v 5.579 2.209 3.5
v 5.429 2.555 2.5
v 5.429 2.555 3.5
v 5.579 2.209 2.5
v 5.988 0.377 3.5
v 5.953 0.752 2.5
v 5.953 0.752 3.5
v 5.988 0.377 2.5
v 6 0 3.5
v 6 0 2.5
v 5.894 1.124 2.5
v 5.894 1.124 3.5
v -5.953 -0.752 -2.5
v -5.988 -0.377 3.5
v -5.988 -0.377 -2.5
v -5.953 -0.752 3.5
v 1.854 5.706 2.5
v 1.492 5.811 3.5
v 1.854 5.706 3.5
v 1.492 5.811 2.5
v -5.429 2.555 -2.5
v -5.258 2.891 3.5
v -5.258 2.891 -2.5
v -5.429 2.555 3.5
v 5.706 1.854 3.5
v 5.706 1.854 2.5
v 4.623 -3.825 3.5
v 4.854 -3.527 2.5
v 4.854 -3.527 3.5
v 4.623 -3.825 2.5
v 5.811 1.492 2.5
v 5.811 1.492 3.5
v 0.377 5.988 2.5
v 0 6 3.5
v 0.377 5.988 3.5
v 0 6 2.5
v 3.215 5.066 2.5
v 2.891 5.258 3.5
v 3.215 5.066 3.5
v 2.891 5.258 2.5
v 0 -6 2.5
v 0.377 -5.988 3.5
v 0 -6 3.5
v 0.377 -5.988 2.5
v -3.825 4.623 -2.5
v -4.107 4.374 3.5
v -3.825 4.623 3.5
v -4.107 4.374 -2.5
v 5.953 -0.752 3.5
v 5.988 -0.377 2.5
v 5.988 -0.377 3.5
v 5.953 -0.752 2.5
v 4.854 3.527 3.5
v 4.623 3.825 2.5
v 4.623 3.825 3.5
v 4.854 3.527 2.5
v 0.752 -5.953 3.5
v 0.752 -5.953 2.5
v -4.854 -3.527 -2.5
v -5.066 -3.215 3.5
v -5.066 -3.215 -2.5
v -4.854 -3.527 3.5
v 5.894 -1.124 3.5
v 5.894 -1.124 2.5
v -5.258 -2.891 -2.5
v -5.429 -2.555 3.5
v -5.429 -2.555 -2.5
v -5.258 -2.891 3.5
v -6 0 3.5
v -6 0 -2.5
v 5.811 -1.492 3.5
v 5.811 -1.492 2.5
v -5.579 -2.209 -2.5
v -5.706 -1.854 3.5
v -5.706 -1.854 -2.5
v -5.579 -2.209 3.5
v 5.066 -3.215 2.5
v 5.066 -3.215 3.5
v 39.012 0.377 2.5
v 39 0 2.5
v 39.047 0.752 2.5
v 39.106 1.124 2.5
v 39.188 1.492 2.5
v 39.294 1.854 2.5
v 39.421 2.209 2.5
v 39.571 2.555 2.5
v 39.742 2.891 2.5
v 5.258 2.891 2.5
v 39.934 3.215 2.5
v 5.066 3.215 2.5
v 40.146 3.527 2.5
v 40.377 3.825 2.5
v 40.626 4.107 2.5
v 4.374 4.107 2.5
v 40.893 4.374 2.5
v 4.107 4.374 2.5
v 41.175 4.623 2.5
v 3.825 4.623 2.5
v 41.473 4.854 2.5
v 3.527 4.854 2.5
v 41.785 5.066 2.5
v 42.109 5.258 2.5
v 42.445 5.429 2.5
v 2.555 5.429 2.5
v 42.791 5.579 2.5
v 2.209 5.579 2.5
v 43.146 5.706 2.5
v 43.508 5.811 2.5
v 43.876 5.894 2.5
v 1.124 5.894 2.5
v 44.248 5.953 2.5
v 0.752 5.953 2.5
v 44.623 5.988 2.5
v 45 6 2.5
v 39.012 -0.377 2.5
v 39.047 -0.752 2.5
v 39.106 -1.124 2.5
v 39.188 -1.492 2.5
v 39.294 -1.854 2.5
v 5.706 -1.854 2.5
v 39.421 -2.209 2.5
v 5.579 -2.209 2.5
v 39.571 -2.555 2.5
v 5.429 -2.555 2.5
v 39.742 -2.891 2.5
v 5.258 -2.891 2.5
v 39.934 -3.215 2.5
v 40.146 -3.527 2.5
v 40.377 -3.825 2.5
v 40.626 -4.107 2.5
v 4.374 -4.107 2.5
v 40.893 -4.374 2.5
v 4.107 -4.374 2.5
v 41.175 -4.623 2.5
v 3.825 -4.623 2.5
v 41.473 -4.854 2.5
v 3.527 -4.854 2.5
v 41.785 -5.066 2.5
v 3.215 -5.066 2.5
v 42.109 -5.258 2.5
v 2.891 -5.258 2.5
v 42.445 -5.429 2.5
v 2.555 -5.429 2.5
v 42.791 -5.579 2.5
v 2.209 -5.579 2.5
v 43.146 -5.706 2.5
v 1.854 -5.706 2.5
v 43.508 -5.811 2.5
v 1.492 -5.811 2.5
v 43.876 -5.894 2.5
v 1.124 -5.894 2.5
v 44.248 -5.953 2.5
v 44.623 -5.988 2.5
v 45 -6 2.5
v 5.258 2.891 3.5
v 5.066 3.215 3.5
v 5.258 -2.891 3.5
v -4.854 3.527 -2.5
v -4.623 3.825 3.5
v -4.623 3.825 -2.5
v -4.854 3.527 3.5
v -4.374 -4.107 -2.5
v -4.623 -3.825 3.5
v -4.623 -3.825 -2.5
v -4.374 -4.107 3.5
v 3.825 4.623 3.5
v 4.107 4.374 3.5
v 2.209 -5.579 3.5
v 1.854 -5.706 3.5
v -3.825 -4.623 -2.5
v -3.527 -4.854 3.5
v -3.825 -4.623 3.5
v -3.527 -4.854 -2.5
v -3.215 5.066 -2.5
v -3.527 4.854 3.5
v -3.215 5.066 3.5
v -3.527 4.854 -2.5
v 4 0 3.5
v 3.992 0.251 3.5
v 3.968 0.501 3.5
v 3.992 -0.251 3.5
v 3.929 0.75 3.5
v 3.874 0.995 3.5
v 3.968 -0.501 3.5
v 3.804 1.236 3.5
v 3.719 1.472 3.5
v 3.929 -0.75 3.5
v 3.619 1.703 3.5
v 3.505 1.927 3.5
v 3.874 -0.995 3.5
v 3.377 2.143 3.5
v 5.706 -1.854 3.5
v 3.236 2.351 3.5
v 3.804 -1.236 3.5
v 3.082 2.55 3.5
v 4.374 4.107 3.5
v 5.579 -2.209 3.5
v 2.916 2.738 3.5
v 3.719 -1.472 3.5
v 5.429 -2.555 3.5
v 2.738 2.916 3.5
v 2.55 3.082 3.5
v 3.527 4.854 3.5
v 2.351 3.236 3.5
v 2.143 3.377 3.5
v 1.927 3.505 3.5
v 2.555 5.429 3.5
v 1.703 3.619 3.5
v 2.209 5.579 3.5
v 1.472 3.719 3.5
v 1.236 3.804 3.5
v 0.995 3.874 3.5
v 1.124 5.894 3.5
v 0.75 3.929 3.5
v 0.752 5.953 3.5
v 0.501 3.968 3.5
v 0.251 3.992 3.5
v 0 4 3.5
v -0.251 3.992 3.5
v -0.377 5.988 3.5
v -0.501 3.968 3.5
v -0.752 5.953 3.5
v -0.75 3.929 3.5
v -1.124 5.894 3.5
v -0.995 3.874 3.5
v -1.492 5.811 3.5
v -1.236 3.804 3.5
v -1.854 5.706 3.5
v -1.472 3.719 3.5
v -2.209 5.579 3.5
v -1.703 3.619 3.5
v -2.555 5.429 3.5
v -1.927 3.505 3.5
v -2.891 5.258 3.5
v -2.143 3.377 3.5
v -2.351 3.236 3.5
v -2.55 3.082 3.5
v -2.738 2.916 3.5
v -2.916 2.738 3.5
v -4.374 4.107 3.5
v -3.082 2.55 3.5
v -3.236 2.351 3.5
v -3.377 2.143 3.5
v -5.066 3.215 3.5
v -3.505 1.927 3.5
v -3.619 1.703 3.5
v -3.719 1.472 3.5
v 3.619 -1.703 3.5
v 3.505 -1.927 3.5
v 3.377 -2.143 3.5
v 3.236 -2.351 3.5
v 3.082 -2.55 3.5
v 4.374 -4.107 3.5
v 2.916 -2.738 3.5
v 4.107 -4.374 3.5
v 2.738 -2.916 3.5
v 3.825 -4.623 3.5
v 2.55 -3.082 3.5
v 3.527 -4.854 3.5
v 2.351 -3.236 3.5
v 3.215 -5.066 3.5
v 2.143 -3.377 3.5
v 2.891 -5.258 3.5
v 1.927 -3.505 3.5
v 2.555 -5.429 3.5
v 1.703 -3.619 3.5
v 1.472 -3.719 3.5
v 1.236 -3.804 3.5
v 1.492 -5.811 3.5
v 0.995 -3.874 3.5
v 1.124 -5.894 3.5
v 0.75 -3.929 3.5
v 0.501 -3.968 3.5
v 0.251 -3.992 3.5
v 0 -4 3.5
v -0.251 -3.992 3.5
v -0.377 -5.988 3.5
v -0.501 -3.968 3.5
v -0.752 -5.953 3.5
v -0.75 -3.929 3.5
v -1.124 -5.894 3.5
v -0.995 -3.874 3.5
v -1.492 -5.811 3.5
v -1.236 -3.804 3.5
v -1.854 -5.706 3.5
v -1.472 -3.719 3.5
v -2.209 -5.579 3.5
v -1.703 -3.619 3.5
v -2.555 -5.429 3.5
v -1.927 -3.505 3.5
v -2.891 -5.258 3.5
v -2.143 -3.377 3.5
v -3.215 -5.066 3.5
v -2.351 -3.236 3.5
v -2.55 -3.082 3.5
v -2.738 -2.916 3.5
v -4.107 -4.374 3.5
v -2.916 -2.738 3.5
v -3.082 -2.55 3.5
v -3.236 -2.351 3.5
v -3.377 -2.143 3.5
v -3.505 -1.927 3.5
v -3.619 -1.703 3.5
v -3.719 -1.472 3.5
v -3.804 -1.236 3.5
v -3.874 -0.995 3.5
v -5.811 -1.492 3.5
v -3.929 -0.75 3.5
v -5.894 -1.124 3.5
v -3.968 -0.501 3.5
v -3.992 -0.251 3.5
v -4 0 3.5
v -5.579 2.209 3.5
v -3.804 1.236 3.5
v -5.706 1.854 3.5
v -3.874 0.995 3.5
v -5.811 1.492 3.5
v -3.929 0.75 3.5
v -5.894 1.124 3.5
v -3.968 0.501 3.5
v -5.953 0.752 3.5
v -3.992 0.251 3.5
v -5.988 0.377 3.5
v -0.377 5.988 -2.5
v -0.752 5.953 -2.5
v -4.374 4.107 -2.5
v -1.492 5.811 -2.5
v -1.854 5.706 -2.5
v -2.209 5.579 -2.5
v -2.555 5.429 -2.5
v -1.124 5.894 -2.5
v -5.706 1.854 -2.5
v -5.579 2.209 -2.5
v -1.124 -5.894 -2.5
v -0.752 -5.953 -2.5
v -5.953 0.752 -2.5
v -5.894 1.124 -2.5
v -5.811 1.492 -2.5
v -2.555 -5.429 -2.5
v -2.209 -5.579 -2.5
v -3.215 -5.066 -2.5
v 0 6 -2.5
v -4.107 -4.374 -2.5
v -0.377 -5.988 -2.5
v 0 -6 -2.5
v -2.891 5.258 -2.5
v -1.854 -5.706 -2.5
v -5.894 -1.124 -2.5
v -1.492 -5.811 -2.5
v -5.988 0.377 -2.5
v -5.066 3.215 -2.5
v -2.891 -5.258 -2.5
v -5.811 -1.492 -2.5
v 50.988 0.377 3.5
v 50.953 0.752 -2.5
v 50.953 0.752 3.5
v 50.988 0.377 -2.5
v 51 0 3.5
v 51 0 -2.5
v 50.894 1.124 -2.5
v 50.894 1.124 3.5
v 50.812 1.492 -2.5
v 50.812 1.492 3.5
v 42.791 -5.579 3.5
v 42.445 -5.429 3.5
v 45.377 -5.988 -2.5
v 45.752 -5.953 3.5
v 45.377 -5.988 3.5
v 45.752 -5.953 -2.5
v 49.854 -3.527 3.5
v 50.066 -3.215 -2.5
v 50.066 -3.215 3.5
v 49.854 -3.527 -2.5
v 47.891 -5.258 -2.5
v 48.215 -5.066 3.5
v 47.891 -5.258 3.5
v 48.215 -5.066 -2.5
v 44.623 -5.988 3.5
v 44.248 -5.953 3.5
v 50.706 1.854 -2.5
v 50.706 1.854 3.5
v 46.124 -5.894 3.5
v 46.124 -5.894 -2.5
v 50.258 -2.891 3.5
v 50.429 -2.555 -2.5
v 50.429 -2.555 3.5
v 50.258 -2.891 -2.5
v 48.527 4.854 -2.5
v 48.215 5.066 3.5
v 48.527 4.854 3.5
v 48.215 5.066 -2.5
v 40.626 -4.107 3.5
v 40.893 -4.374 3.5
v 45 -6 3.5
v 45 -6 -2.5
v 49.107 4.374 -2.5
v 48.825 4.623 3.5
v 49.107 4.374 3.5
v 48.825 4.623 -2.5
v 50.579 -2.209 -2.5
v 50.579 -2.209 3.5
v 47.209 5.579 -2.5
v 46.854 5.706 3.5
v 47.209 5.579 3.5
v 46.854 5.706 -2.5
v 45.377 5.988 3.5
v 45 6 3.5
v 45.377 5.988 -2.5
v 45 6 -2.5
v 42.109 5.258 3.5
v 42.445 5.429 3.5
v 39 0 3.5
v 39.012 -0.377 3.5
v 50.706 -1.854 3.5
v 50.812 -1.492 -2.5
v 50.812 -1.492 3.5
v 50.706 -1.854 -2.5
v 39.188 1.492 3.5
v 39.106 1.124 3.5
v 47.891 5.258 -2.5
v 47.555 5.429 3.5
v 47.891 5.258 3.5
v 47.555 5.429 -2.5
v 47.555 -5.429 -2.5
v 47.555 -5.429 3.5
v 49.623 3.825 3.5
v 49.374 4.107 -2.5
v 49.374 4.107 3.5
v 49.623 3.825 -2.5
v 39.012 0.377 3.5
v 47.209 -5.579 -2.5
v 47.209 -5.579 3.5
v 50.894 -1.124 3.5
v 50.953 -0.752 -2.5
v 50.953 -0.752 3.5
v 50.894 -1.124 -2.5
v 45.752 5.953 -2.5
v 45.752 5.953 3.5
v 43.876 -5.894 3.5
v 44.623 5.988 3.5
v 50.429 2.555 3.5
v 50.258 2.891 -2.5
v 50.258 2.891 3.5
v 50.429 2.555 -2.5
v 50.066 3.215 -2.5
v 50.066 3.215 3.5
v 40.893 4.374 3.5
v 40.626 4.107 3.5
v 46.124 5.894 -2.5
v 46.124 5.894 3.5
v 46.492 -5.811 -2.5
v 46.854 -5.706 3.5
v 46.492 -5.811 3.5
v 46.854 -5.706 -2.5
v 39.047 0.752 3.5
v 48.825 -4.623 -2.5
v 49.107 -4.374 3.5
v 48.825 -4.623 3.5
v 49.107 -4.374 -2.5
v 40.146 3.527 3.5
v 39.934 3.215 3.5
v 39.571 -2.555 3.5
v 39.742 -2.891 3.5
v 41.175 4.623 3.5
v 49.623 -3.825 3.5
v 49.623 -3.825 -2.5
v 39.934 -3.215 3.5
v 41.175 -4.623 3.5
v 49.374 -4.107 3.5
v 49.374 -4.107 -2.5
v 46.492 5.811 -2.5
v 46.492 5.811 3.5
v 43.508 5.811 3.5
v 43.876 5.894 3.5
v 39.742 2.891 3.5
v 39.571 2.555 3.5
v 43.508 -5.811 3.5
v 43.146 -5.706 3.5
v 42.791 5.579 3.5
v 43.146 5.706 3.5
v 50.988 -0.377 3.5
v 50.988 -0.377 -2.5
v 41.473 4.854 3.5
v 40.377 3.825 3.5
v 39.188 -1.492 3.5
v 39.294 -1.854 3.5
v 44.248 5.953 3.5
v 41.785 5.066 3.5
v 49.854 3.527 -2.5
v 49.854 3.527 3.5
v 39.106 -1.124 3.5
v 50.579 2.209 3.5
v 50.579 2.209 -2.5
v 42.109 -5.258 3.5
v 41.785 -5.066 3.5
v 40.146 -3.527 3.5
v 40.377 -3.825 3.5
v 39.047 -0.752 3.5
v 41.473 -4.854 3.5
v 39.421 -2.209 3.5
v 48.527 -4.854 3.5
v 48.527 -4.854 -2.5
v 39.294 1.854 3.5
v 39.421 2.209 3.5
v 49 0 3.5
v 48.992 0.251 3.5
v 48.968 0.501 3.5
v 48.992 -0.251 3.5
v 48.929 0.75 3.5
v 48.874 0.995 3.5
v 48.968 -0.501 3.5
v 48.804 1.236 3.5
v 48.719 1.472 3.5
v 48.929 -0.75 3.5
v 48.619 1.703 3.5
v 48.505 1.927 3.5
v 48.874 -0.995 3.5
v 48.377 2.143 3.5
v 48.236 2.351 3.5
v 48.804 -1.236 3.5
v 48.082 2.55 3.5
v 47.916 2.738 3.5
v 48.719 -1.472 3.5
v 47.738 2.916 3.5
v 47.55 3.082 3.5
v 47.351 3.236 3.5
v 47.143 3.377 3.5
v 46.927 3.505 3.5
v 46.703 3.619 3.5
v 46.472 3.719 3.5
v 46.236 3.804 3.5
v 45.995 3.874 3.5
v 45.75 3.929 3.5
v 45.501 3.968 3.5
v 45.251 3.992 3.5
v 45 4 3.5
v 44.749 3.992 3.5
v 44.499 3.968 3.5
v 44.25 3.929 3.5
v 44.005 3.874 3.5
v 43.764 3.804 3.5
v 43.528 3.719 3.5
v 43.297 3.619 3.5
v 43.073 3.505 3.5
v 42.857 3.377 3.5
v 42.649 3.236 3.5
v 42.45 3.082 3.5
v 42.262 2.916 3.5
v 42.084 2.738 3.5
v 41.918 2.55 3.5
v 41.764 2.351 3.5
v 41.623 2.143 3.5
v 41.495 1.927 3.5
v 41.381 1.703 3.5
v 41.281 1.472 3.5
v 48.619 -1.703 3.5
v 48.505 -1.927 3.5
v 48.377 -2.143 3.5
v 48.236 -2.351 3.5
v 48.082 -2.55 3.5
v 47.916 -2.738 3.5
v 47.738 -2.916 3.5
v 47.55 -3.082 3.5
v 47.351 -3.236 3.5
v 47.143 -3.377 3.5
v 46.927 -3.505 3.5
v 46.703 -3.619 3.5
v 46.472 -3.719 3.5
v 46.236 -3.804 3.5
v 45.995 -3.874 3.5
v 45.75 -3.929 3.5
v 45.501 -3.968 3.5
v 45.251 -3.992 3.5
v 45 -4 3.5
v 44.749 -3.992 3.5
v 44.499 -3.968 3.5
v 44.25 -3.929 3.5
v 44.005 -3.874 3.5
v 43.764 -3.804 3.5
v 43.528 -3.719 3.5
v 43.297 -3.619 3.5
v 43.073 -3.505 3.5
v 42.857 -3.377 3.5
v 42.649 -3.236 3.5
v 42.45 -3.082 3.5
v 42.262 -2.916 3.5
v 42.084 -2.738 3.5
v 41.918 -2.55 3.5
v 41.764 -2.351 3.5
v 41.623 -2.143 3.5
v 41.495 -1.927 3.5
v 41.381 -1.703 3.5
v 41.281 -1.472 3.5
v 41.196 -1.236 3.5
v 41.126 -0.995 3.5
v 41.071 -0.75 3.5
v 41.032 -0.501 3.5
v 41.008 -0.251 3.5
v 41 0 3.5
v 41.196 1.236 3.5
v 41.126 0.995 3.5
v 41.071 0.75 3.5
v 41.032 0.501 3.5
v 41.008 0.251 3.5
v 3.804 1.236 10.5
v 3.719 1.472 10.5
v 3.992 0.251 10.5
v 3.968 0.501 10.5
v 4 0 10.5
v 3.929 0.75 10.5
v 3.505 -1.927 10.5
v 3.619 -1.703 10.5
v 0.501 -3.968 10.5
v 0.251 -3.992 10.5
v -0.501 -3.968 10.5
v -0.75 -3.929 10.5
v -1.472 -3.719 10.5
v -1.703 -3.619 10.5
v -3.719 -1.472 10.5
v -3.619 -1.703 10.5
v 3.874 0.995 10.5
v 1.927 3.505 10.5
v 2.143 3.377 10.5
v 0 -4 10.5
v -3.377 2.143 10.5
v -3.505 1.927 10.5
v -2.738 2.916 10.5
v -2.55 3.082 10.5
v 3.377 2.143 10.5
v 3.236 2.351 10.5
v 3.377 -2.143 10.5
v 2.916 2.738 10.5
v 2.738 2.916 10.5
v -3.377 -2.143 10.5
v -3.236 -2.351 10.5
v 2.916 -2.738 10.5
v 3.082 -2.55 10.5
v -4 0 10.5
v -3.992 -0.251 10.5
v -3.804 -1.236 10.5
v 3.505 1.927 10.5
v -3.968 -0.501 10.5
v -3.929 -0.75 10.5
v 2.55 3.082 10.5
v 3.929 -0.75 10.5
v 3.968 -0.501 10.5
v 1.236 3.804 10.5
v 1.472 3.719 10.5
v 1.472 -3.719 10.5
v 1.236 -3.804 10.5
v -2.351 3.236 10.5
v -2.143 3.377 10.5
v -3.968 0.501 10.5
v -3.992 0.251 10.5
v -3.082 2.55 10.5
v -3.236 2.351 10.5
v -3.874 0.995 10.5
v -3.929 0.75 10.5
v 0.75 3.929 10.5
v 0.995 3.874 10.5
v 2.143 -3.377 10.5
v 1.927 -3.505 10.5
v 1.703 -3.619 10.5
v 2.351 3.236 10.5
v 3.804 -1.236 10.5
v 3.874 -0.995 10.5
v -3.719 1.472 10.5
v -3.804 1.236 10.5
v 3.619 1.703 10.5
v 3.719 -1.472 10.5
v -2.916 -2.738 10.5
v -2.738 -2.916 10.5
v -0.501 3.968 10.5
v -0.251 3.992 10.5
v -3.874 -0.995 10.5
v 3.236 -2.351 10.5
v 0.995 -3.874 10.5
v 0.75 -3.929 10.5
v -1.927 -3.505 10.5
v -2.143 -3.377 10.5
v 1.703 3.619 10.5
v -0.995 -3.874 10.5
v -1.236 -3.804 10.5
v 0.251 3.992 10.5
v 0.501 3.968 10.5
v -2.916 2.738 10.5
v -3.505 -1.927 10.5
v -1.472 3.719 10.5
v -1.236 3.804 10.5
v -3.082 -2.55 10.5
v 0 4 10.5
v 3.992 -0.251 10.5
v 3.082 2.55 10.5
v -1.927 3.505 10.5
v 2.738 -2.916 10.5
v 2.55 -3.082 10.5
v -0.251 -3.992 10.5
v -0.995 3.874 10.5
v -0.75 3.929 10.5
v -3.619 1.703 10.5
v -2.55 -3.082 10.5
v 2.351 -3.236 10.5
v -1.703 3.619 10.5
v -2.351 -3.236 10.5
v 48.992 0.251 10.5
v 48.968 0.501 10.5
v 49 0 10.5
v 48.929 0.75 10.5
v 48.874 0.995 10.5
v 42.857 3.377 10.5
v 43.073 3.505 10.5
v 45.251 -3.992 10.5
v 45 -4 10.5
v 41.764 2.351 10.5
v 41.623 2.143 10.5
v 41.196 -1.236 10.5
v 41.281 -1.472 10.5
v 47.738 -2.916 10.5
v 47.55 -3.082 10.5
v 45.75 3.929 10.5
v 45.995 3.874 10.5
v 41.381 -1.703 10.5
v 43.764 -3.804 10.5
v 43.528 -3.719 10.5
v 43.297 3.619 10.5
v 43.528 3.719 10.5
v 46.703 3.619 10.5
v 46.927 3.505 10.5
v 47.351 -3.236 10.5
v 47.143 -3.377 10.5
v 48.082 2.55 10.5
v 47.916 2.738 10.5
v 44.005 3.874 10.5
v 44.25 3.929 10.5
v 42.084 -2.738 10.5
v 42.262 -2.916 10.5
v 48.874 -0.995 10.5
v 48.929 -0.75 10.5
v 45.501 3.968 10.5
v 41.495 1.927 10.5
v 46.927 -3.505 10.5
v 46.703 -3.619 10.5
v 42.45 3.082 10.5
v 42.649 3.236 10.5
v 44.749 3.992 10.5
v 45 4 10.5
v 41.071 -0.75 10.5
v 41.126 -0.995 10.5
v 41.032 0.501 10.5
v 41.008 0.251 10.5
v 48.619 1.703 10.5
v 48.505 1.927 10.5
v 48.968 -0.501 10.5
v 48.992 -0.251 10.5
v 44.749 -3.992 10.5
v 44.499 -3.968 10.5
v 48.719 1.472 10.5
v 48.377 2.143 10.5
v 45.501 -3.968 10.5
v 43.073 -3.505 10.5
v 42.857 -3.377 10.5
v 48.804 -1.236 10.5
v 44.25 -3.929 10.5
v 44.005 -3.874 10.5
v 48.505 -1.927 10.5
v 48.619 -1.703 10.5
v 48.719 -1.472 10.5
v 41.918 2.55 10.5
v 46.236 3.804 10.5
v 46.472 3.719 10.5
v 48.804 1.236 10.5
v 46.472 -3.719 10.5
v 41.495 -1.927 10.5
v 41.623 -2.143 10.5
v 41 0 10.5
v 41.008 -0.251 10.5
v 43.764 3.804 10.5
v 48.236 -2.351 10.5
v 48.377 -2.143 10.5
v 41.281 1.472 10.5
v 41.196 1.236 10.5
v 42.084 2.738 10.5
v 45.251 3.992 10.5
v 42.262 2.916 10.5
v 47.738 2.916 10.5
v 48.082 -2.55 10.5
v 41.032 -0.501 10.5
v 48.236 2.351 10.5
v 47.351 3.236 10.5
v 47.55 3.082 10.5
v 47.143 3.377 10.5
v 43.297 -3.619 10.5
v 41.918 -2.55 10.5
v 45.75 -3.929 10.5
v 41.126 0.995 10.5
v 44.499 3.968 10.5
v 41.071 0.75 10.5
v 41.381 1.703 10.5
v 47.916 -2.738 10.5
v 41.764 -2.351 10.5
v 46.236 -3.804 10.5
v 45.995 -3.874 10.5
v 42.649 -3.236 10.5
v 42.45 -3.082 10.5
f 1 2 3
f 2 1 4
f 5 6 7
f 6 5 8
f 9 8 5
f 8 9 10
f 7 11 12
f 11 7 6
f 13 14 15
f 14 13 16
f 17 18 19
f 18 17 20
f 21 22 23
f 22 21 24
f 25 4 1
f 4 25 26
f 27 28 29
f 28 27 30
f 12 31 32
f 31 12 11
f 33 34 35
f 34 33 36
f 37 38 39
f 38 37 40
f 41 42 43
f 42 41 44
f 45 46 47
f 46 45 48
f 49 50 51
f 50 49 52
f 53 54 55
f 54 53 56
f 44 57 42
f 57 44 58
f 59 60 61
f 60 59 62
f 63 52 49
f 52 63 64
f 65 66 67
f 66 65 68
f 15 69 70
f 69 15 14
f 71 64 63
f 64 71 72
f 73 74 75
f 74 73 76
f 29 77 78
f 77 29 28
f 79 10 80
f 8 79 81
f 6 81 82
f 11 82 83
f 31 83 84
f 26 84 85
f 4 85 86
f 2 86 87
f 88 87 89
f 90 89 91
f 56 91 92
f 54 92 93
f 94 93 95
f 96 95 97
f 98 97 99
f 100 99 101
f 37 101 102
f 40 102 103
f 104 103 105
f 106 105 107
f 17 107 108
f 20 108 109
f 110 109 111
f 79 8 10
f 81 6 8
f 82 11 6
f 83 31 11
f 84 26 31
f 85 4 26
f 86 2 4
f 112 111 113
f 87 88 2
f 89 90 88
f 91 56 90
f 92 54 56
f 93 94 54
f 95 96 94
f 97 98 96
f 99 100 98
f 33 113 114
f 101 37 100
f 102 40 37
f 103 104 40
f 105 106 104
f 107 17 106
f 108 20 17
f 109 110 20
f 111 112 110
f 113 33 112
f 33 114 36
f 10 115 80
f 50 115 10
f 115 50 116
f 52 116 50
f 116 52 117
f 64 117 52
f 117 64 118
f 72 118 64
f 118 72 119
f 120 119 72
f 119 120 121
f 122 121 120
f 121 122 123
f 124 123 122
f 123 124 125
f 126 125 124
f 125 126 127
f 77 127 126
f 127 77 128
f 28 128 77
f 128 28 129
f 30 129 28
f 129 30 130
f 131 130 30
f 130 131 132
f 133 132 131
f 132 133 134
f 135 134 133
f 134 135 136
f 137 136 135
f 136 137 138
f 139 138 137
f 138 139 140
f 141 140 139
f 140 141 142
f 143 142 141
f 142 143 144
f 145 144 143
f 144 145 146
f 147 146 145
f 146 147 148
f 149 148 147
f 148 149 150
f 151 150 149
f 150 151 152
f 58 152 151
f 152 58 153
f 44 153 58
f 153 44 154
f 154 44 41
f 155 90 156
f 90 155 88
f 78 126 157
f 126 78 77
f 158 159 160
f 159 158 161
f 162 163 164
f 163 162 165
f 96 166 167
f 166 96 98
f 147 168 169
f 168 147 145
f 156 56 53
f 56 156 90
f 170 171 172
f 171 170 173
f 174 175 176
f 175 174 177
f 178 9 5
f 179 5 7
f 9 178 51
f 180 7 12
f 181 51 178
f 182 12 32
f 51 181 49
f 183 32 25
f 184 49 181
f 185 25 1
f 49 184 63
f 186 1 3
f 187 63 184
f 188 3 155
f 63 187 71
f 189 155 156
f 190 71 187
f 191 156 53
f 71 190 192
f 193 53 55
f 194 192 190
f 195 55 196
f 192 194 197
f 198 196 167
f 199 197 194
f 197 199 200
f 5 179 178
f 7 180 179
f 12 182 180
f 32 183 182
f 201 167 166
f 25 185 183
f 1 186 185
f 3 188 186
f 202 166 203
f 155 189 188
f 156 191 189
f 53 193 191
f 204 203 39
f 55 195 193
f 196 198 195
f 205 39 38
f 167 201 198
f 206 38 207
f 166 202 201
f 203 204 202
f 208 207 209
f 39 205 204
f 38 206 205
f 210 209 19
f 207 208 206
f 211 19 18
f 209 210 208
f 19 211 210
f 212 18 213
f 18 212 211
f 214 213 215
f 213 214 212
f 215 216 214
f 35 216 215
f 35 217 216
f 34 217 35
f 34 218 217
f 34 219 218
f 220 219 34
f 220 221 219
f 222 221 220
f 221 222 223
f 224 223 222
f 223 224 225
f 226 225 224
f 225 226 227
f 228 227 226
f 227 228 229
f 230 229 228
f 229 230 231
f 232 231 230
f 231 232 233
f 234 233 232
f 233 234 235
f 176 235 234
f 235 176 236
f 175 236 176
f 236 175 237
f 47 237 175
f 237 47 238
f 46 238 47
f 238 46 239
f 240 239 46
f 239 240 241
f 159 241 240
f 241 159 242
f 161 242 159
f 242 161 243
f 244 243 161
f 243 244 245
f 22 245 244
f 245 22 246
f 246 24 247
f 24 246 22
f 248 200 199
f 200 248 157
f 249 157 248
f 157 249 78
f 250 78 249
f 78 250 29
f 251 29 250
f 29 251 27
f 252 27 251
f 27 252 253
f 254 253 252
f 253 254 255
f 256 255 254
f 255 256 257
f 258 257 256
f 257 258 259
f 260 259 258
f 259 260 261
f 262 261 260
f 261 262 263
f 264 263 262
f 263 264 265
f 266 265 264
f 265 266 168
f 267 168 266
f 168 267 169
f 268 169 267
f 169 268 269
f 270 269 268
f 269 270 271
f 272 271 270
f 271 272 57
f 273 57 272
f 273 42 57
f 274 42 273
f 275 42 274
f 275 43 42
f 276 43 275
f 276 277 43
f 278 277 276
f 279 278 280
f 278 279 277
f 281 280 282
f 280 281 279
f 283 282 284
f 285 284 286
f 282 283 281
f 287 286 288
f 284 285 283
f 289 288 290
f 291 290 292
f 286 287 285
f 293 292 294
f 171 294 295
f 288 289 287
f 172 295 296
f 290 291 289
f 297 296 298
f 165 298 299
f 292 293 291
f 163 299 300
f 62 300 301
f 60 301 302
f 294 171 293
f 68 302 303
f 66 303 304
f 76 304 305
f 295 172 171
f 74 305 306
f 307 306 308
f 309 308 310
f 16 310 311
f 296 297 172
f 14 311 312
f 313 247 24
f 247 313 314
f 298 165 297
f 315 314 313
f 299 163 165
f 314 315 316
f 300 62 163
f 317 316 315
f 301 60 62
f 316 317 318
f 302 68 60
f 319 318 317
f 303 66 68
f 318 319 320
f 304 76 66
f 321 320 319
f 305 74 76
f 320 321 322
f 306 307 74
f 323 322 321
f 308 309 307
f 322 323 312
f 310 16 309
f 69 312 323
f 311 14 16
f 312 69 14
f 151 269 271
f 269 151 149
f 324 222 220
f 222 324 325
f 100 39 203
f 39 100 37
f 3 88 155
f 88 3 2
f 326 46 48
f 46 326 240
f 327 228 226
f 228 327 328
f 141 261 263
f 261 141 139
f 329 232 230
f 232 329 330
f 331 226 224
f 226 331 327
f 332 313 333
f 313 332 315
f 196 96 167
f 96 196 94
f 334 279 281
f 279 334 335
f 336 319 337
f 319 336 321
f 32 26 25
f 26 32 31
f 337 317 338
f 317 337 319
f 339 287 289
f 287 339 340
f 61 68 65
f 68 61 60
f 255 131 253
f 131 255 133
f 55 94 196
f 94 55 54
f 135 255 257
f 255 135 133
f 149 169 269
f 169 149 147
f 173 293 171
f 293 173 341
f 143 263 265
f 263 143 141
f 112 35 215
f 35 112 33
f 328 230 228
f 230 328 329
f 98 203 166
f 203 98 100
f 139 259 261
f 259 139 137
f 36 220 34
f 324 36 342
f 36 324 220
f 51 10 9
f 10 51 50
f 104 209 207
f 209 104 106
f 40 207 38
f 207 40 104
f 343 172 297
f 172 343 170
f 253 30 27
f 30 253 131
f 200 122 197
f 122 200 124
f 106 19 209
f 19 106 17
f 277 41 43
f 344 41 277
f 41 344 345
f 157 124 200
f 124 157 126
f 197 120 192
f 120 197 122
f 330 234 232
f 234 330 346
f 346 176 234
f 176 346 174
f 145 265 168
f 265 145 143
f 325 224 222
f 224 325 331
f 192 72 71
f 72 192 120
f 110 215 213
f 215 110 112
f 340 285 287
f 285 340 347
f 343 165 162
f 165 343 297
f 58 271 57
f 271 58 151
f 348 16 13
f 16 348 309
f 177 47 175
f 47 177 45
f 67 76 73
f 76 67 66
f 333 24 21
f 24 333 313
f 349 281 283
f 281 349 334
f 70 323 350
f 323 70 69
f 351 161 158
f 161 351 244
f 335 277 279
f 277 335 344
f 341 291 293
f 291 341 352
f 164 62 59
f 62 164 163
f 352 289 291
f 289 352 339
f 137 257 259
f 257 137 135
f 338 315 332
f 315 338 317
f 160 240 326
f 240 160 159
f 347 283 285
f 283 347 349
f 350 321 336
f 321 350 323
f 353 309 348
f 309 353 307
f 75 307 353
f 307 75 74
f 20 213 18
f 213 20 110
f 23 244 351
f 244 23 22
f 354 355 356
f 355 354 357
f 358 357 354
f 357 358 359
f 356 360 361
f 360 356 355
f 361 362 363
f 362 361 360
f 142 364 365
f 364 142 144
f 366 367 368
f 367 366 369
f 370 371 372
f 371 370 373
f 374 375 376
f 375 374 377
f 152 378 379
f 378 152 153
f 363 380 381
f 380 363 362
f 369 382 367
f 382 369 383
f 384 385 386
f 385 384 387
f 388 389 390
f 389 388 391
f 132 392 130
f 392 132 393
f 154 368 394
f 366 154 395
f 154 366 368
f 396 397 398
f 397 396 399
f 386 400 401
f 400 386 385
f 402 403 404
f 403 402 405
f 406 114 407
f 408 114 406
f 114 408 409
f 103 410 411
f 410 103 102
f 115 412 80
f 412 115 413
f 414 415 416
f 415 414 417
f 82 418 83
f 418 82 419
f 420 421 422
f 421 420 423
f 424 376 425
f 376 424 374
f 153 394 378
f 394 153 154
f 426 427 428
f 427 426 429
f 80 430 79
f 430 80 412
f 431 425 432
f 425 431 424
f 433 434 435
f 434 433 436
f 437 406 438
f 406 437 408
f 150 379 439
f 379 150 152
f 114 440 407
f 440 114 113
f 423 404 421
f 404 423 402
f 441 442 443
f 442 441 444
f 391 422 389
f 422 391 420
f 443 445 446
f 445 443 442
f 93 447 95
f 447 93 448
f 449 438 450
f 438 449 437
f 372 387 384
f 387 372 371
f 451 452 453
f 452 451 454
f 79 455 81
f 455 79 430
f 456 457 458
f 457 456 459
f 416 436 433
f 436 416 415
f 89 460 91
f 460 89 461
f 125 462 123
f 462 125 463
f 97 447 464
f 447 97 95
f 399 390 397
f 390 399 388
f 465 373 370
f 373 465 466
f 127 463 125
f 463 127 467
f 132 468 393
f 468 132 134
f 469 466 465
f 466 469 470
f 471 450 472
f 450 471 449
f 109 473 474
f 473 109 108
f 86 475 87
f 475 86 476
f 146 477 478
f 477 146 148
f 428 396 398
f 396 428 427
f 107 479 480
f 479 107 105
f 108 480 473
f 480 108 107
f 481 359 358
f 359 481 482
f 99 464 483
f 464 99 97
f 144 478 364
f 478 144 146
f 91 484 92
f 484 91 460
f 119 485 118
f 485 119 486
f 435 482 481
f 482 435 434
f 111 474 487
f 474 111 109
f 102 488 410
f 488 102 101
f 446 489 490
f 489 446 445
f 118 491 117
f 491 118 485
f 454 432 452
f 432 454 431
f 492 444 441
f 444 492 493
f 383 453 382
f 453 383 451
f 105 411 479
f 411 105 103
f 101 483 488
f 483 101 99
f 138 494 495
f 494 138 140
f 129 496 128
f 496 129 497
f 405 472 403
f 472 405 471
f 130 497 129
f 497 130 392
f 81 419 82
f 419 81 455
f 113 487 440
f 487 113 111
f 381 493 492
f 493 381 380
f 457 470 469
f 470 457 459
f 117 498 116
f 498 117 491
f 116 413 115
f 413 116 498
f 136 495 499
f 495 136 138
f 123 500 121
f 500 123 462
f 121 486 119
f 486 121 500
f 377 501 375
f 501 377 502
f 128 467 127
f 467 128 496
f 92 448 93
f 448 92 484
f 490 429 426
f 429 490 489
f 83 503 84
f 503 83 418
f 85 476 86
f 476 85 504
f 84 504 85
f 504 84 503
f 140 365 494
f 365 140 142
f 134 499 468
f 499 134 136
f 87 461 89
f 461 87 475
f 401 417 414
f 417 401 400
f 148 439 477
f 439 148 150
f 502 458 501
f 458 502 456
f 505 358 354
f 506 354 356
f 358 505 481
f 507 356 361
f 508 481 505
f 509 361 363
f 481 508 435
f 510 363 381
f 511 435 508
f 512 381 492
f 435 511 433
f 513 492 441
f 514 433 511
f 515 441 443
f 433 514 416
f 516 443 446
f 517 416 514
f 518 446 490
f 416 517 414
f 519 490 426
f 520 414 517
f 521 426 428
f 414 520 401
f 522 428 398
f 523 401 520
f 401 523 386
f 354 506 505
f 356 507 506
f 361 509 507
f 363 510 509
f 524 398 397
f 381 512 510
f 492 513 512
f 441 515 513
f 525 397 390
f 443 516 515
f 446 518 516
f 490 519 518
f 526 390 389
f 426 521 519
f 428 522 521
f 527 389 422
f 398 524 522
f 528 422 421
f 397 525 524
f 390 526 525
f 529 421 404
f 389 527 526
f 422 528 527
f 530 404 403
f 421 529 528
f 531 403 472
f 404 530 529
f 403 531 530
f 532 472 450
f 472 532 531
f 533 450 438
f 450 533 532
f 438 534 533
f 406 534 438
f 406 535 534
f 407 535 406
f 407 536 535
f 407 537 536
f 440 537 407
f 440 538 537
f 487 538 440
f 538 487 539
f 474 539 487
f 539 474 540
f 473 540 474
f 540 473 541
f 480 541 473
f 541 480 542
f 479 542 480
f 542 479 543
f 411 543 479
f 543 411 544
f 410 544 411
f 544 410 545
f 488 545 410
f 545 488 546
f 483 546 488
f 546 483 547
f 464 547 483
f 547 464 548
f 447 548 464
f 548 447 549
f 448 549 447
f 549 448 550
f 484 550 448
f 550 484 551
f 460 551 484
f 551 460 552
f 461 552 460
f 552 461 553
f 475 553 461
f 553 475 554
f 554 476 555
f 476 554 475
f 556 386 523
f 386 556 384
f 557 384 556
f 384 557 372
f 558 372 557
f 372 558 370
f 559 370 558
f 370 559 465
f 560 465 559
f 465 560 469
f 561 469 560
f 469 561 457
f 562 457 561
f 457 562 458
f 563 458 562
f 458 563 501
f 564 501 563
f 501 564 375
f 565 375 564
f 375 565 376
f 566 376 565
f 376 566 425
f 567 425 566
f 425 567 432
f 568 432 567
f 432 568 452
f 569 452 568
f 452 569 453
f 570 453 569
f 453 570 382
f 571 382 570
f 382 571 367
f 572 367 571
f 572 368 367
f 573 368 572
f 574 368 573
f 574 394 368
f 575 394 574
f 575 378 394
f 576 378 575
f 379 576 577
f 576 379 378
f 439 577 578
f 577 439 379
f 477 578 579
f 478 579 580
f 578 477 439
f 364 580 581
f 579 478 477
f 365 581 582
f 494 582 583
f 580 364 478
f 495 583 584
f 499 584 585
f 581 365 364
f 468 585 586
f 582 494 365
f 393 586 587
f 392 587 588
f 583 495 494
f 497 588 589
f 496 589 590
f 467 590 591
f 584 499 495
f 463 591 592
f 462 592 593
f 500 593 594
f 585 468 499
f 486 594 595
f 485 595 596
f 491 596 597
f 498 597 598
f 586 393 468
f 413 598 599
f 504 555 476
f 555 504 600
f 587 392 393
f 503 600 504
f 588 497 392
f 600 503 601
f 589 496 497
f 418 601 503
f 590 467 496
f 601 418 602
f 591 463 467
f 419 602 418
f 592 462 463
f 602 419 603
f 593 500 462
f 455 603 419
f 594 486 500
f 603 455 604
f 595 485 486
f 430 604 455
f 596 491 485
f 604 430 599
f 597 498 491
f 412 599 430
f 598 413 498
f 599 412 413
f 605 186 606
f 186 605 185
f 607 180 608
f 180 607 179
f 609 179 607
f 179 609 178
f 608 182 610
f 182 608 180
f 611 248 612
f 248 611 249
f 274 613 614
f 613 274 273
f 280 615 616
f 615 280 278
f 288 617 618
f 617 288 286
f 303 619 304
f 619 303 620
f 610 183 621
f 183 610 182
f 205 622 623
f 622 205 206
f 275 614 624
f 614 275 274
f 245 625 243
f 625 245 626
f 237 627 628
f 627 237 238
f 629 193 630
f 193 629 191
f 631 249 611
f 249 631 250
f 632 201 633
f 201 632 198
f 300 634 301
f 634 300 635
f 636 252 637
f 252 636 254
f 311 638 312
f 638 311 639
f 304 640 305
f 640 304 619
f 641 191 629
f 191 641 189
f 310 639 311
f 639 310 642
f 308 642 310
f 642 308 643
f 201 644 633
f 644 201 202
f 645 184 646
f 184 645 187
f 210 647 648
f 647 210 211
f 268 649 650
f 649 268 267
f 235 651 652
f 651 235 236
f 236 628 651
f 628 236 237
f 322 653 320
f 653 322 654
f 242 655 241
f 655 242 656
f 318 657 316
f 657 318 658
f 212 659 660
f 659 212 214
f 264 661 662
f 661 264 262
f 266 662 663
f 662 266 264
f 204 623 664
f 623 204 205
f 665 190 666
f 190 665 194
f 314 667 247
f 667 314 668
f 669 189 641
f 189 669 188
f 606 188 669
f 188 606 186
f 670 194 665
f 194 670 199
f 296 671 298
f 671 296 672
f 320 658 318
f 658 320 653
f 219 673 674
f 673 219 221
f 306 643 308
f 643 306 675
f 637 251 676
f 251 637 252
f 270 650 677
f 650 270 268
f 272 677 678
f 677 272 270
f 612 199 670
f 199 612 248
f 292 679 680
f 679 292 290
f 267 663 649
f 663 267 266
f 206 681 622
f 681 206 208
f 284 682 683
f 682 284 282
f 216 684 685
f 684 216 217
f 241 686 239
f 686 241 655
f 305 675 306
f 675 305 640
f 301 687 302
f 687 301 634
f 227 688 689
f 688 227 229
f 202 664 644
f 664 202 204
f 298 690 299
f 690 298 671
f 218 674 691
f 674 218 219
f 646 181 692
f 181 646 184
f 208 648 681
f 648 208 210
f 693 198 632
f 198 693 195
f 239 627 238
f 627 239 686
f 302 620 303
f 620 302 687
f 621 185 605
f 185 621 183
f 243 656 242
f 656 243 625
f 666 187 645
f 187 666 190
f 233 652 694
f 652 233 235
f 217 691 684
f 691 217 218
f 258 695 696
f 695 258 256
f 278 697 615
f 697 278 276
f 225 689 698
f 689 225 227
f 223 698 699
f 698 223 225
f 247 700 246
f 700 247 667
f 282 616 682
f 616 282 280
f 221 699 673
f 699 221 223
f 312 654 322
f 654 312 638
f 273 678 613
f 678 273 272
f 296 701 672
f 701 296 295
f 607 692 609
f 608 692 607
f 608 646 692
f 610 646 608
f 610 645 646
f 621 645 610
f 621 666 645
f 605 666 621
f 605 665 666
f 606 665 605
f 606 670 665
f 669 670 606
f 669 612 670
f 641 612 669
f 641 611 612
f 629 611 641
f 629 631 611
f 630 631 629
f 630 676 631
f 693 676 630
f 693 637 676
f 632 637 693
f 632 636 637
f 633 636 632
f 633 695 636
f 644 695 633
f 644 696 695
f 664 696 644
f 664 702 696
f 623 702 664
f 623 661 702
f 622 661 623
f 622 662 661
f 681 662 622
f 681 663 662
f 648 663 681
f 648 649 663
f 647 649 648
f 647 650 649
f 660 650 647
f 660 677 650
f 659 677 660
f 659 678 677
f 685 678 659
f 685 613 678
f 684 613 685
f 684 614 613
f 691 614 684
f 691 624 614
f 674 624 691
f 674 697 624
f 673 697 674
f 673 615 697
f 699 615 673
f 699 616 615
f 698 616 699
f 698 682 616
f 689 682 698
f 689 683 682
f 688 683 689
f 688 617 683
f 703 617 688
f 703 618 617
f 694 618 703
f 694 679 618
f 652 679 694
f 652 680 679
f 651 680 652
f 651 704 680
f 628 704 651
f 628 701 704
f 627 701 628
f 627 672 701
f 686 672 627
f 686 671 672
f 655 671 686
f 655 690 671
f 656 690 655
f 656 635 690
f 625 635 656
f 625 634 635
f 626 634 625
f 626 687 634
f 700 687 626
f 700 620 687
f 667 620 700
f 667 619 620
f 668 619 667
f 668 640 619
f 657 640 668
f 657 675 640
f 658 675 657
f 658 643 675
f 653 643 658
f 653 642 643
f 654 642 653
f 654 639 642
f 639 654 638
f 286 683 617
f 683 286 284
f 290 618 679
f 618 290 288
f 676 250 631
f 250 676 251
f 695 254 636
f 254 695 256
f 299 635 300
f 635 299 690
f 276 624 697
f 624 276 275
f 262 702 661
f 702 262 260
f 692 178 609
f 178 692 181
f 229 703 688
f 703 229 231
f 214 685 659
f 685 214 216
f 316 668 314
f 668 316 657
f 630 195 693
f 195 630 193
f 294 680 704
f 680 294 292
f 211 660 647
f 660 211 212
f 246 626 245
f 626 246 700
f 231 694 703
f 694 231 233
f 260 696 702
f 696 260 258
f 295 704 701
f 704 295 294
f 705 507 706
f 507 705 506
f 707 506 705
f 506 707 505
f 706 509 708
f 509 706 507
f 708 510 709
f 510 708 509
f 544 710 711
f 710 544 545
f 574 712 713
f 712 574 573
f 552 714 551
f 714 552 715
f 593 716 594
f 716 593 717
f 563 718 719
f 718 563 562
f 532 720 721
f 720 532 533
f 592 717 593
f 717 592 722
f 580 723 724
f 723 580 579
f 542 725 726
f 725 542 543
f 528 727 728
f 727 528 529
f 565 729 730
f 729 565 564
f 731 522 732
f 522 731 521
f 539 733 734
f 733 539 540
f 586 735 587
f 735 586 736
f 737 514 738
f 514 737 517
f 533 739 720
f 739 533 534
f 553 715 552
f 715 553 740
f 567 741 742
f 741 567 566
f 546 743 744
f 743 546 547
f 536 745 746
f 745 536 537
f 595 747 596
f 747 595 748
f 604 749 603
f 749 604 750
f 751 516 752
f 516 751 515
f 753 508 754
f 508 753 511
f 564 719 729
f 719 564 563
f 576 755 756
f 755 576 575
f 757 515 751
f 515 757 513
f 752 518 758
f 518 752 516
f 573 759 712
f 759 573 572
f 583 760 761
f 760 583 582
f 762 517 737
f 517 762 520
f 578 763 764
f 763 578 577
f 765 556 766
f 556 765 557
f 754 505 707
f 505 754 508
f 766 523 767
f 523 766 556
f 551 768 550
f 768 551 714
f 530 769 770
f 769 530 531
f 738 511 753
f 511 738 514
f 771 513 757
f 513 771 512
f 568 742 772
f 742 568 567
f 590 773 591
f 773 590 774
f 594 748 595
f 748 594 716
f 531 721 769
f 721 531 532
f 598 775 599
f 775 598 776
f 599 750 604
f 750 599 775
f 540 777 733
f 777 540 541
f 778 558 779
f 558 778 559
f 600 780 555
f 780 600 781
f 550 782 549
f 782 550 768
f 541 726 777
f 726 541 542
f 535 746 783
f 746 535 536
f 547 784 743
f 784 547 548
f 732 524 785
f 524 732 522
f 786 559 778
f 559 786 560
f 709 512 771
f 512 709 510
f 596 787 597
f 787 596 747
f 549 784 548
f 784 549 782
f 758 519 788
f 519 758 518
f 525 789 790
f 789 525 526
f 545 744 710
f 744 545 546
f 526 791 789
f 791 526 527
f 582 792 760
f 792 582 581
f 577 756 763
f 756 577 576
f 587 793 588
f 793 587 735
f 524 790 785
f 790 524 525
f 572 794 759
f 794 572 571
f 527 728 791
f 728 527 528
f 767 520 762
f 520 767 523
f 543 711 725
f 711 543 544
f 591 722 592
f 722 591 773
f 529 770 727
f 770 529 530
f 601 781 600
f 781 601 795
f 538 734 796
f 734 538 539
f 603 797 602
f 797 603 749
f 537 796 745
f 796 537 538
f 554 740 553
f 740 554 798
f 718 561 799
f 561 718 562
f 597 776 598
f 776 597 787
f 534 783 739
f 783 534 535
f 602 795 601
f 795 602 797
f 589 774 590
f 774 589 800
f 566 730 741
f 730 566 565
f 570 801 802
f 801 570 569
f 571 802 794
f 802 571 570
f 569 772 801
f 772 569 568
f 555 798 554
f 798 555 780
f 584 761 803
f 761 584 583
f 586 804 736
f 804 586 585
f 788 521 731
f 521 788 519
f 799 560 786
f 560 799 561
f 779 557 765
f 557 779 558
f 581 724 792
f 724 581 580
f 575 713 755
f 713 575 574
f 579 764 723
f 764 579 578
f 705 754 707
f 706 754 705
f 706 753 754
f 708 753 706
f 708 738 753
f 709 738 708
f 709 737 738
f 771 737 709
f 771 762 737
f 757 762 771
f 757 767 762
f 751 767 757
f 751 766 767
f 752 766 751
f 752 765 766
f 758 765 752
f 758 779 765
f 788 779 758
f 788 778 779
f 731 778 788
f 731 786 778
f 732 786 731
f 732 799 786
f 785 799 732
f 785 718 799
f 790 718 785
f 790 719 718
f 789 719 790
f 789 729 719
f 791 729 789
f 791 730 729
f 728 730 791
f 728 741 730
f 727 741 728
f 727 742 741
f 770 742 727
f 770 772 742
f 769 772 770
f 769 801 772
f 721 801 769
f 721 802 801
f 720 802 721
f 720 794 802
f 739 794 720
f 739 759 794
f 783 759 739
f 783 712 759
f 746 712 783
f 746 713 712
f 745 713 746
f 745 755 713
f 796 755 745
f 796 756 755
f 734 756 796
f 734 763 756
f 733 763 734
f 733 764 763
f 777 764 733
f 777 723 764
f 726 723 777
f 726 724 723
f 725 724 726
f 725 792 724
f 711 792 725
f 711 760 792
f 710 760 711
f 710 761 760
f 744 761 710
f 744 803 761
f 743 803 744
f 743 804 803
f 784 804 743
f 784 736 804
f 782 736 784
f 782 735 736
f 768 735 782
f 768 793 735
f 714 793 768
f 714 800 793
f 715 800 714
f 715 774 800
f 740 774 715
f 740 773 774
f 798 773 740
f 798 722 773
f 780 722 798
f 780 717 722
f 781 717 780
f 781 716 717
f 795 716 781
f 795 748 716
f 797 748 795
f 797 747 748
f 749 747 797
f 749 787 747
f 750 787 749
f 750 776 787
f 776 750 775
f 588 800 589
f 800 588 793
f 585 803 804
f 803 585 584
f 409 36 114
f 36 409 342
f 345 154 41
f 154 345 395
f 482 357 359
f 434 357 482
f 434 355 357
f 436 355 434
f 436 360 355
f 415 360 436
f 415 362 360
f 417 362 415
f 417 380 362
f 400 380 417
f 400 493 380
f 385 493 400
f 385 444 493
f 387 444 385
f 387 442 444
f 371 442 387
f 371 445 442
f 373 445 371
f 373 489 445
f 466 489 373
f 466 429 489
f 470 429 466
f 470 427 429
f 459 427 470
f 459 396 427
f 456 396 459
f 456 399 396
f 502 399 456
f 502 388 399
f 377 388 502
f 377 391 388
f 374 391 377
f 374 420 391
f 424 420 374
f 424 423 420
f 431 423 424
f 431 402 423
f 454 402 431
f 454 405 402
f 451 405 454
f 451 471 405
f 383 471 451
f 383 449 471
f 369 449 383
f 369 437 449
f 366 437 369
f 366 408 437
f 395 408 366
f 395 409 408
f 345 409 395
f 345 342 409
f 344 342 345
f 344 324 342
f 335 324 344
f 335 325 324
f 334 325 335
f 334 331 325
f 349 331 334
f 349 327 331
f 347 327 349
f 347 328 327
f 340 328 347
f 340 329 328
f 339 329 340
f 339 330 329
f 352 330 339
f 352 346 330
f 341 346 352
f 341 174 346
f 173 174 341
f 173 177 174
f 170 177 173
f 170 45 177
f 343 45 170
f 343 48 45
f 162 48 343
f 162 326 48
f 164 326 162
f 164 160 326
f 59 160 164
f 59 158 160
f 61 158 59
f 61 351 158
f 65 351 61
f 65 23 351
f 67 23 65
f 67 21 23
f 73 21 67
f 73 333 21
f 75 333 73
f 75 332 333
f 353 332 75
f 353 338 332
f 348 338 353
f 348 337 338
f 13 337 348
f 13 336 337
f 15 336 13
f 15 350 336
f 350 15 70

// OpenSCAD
// ==========================================
// 1. KONFIGURACJA TESTERA (Parametry)
// ==========================================
// Moduł
m = 1;  
// Liczba zębów pierwszej zębatki
z1 = 60;         
// Liczba zębów drugiej zębatki
z2 = 30;            

// Średnica trzpienia
s_o = 8;       
// Wysokość trzpienia
h_o = 7;      
// Grubość płyty podstawy
h_p = 5;            

// Szerokość kołnierza (podkładki)
s_po = 2;           
// Wysokość podkładki
h_po = 1;           

// Gładkość okręgów
$fn = 100;          

// ==========================================
// 2. OBLICZENIA GEOMETRYCZNE
// ==========================================
r_z1 = (z1 * m) / 2; 
r_z2 = (z2 * m) / 2; 
r_o  = s_o / 2;      
r_kolnierza = r_o + s_po; 

// Rozstaw osi: suma promieni podziałowych
odleglosc_osiowa = r_z1 + r_z2; 

// Obliczenia pozycji z
poz_z_podkladki = (h_p / 2) + (h_po / 2);
// Trzpień musi być przesunięty o połowę grubości podstawy + całą podkładkę + połowę swojej wysokości
poz_z_trzpienia = (h_p / 2) + h_po + (h_o / 2);

// ==========================================
// 3. MODUŁ PODSTAWY TESTOWEJ
// ==========================================
module tester_zebatek() {
    
    // --- PŁYTA GŁÓWNA (Podstawa) ---
    hull() {
        translate([0, 0, 0])
            cylinder(h = h_p, r = r_kolnierza, center = true);
        
        translate([odleglosc_osiowa, 0, 0])
            cylinder(h = h_p, r = r_kolnierza, center = true);
    }

    // --- PODKŁADKI DYSTANSOWE ---
    union() {
        translate([0, 0, poz_z_podkladki])
            cylinder(h = h_po, r = r_kolnierza, center = true);

        translate([odleglosc_osiowa, 0, poz_z_podkladki])
            cylinder(h = h_po, r = r_kolnierza, center = true);
    }

    // --- TRZPIENIE (OSIE MONTAŻOWE) ---
    union() {
        translate([0, 0, poz_z_trzpienia])
            cylinder(h = h_o, r = r_o, center = true);

        translate([odleglosc_osiowa, 0, poz_z_trzpienia])
            cylinder(h = h_o, r = r_o, center = true);
    }
}

// ==========================================
// 4. WYWOŁANIE MODELU
// ==========================================
tester_zebatek();
